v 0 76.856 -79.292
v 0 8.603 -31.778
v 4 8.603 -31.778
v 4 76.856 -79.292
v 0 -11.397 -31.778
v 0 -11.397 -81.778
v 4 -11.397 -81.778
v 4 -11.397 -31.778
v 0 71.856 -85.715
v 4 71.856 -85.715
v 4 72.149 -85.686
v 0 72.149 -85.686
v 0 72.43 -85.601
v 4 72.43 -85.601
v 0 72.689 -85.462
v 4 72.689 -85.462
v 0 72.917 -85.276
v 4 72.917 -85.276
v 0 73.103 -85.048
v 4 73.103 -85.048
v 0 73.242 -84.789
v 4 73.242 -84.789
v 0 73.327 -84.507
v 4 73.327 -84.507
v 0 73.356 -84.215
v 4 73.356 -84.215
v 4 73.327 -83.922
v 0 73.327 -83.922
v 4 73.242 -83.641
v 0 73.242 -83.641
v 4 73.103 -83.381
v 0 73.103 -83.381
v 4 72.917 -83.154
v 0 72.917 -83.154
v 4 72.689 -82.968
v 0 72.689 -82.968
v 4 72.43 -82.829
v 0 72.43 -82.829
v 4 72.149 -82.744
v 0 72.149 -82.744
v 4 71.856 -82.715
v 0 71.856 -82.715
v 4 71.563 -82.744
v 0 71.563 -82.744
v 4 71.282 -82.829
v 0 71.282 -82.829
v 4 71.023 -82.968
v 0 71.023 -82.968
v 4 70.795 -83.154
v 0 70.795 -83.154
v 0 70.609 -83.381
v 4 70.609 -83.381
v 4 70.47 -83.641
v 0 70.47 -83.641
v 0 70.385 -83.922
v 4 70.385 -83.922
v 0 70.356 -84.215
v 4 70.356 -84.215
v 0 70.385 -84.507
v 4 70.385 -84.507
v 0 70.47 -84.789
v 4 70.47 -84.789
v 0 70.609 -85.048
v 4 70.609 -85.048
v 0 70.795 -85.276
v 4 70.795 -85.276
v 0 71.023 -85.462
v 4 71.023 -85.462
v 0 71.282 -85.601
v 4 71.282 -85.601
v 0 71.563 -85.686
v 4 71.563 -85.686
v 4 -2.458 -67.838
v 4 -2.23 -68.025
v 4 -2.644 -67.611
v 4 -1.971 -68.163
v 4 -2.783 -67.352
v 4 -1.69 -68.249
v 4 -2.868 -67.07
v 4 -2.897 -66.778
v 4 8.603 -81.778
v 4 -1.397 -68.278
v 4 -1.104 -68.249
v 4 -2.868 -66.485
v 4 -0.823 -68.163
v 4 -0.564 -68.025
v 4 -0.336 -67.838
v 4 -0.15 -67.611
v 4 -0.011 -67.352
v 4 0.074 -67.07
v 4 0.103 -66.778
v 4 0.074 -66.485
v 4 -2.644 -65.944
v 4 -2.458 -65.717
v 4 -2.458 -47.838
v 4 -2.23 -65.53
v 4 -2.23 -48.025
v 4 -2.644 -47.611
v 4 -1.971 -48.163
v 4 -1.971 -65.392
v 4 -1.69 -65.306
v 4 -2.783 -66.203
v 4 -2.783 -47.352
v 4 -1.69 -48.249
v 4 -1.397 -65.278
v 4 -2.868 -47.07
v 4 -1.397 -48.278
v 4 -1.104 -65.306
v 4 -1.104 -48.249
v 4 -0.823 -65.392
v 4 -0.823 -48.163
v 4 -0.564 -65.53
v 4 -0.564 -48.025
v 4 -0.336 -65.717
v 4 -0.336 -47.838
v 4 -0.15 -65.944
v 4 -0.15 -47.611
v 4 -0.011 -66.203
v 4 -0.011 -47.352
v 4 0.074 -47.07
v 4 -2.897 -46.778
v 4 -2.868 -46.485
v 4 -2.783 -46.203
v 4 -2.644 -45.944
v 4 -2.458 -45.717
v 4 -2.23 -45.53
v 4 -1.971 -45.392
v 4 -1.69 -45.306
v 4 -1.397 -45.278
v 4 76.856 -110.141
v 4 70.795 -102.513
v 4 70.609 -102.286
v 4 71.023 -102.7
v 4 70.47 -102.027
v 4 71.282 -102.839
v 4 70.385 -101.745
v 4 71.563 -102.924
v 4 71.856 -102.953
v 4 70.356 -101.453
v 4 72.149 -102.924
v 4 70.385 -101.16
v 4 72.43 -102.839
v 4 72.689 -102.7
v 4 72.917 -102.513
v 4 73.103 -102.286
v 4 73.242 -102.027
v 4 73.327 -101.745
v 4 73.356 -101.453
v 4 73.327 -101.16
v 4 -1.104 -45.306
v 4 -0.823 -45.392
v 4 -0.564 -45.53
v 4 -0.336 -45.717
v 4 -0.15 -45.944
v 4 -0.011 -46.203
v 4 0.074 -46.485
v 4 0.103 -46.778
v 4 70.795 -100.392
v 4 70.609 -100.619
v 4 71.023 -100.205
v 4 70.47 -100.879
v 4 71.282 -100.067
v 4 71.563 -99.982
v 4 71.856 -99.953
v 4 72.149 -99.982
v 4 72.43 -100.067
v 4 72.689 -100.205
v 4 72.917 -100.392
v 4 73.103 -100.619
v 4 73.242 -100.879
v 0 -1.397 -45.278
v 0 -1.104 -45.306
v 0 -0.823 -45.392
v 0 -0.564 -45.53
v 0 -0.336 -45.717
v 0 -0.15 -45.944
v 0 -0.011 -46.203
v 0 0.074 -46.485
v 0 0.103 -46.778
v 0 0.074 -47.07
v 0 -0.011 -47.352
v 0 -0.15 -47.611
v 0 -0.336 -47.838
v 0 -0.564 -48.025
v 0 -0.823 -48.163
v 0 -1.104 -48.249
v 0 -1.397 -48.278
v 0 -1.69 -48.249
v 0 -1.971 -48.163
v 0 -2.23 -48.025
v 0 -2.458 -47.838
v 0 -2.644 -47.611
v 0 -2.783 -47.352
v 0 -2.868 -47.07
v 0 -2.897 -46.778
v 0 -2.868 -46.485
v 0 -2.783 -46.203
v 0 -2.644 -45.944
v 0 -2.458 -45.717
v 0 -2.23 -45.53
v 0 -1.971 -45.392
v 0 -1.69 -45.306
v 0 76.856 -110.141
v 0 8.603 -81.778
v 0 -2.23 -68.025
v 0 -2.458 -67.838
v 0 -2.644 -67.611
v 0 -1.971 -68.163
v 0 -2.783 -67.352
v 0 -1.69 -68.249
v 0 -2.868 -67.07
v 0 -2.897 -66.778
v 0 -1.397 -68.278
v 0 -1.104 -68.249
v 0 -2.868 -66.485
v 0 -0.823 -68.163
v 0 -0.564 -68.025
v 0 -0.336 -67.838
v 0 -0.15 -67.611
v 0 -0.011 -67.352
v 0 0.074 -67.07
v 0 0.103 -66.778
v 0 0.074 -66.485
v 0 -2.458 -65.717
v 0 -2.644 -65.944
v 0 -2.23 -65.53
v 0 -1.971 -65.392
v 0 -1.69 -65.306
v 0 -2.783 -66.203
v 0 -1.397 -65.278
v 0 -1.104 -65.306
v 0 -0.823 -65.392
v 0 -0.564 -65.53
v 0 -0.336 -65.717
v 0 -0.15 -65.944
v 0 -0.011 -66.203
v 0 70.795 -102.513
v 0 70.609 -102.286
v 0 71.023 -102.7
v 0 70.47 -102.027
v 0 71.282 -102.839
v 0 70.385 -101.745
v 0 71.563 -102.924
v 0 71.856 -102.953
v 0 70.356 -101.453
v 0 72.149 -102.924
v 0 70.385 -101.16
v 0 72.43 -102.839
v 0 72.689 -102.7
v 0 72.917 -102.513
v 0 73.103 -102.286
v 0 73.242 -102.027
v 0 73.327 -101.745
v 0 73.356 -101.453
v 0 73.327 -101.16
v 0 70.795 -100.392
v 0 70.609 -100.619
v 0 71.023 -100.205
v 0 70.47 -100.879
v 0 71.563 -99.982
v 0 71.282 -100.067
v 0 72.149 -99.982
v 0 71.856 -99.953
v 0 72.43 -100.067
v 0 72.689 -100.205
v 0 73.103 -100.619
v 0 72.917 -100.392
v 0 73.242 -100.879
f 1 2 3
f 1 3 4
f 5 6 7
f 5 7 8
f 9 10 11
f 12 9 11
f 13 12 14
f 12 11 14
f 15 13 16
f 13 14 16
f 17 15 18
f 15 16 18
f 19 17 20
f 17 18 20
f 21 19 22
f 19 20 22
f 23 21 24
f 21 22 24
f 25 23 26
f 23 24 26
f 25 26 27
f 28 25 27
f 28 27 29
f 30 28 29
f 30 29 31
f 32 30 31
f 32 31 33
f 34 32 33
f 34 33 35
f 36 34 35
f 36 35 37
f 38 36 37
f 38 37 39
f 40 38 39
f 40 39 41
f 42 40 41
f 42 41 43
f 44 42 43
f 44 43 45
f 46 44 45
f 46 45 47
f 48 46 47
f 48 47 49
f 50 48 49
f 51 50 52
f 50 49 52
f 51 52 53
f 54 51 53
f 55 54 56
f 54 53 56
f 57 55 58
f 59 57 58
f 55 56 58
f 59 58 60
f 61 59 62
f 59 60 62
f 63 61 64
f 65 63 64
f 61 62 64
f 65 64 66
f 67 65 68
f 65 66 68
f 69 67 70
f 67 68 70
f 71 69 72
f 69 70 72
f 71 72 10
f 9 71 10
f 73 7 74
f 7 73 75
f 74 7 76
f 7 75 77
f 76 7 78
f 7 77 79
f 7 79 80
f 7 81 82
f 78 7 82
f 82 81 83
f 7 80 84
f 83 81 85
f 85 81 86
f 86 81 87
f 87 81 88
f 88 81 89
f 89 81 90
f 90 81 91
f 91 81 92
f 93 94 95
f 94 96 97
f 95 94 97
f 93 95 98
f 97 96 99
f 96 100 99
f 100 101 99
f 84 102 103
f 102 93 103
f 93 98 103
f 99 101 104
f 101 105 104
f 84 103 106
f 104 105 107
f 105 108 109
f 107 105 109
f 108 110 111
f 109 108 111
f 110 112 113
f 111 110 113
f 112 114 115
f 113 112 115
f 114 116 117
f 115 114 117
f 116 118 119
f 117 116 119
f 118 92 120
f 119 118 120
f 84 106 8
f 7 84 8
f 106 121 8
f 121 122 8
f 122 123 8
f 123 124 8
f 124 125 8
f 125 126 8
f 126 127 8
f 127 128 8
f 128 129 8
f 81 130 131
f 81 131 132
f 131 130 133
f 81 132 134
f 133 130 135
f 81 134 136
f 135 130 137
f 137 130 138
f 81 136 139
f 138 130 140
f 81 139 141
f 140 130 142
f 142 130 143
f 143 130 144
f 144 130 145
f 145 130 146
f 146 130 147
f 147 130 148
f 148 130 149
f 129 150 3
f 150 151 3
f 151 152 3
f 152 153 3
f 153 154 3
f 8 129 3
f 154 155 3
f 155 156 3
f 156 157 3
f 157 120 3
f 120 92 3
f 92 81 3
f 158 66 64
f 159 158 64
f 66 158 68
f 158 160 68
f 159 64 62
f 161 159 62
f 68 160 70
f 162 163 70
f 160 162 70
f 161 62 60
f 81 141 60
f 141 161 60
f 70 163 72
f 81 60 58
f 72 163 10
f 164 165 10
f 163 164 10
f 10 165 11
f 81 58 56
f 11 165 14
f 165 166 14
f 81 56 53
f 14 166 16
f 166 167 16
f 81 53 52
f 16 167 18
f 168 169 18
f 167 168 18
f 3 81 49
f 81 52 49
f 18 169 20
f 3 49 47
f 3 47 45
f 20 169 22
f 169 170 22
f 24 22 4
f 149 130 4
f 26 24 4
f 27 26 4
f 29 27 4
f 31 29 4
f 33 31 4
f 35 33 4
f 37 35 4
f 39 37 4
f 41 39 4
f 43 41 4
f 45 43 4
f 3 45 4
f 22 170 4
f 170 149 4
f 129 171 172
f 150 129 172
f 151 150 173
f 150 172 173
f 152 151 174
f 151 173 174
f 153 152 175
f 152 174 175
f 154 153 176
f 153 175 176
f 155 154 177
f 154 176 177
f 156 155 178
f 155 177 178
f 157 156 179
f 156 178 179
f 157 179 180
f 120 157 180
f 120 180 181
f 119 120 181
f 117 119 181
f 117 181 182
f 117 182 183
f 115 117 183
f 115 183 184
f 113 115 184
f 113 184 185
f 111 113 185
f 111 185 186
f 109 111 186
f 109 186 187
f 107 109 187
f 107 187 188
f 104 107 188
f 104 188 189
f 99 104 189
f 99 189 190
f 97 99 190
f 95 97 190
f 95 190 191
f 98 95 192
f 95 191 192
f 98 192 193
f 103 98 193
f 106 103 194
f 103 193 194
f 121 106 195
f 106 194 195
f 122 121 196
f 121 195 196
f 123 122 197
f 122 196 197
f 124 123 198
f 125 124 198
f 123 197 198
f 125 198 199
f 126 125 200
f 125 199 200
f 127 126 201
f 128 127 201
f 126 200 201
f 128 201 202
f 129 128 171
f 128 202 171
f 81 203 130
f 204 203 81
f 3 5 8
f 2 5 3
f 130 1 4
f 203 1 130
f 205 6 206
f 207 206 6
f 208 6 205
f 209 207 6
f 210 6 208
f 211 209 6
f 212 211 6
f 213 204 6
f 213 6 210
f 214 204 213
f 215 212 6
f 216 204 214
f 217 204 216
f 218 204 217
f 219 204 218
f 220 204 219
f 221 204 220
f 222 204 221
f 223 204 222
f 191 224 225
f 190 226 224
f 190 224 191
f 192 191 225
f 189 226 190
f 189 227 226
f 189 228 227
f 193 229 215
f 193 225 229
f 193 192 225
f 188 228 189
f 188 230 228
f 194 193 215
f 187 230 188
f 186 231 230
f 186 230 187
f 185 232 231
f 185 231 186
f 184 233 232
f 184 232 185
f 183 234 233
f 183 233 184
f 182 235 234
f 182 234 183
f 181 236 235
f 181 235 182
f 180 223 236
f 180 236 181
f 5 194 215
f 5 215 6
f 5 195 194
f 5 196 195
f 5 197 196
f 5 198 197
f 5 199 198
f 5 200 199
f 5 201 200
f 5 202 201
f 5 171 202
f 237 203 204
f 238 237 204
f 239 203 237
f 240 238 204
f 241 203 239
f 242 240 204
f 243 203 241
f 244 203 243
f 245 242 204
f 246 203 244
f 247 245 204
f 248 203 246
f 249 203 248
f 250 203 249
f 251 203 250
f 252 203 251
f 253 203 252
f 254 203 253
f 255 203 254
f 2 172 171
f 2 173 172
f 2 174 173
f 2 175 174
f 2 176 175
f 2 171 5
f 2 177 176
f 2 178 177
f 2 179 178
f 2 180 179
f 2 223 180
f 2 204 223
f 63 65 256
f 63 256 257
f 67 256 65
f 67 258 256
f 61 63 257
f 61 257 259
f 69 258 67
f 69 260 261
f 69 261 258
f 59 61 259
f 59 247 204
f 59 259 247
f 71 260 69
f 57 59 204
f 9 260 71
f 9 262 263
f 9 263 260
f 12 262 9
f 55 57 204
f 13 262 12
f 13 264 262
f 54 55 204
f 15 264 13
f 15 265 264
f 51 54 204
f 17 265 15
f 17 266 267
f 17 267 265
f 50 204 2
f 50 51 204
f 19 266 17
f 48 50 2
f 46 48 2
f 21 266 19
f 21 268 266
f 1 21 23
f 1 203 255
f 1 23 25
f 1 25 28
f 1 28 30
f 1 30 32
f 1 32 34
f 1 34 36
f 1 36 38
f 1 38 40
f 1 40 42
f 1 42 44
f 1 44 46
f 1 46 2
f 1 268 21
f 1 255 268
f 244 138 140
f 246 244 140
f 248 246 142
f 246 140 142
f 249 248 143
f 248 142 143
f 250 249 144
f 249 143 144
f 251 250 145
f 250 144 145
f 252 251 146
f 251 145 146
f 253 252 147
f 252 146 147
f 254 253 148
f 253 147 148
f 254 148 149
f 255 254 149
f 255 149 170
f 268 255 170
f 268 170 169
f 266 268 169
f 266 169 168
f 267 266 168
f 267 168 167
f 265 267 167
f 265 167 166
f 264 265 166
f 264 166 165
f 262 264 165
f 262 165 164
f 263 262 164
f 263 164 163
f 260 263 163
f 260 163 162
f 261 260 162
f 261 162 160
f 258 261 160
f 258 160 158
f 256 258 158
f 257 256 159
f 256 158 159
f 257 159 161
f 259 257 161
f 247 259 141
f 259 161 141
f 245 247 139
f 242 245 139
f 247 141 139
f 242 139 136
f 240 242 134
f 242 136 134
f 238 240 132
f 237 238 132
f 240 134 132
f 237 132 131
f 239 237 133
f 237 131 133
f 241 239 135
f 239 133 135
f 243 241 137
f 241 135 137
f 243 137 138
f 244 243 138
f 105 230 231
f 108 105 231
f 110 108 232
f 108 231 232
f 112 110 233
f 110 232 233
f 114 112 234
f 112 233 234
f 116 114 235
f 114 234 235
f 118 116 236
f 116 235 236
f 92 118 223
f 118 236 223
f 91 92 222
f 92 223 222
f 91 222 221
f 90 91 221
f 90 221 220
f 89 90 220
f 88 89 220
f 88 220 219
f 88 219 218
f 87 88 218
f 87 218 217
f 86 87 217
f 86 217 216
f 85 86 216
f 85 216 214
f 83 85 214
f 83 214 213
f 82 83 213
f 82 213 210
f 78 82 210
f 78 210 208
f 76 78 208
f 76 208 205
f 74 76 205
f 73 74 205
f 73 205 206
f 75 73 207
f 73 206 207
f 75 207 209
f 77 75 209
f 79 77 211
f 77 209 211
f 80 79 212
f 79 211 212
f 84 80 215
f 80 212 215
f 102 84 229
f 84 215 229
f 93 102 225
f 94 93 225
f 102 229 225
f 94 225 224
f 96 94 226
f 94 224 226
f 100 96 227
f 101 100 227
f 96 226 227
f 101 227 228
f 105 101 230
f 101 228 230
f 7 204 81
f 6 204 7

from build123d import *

# Parameters (mm, degrees)
SALIENTE_EXTRUIR1_DEPTH = 4
CROQUIS2_R              = 1.5
CORTAR_EXTRUIR1_DEPTH   = 13
CROQUIS3_R              = 1.5
CORTAR_EXTRUIR2_DEPTH   = 23


with BuildPart() as part:
    # Croquis1 → Saliente-Extruir1 (new body)
    with BuildSketch(Plane(origin=(0, 0, 0), x_dir=(0, 0, -1), z_dir=(1, 0, 0))):
        Polygon((31.77750931, 8.602977891), (79.291659343, 76.856040613), (110.141305144, 76.856040613), (81.77750931, 8.602977891), (81.77750931, -11.397022109), (31.77750931, -11.397022109), align=None)
    extrude(amount=SALIENTE_EXTRUIR1_DEPTH)

    # Croquis2 → Cortar-Extruir1 (cut)
    with BuildSketch(Plane(origin=(4, 0, 0), x_dir=(0, 0, -1), z_dir=(1, 0, 0))):
        with Locations((84.214840877, 71.856040613)):
            Circle(CROQUIS2_R)
        with Locations((101.452703983, 71.856040613)):
            Circle(CROQUIS2_R)
    extrude(amount=-CORTAR_EXTRUIR1_DEPTH, mode=Mode.SUBTRACT)

    # Croquis3 → Cortar-Extruir2 (cut)
    with BuildSketch(Plane.ZY):
        with Locations((-66.77750931, -1.397022109)):
            Circle(CROQUIS3_R)
        with Locations((-46.77750931, -1.397022109)):
            Circle(CROQUIS3_R)
    extrude(amount=-CORTAR_EXTRUIR2_DEPTH, mode=Mode.SUBTRACT)


solid = part.part
